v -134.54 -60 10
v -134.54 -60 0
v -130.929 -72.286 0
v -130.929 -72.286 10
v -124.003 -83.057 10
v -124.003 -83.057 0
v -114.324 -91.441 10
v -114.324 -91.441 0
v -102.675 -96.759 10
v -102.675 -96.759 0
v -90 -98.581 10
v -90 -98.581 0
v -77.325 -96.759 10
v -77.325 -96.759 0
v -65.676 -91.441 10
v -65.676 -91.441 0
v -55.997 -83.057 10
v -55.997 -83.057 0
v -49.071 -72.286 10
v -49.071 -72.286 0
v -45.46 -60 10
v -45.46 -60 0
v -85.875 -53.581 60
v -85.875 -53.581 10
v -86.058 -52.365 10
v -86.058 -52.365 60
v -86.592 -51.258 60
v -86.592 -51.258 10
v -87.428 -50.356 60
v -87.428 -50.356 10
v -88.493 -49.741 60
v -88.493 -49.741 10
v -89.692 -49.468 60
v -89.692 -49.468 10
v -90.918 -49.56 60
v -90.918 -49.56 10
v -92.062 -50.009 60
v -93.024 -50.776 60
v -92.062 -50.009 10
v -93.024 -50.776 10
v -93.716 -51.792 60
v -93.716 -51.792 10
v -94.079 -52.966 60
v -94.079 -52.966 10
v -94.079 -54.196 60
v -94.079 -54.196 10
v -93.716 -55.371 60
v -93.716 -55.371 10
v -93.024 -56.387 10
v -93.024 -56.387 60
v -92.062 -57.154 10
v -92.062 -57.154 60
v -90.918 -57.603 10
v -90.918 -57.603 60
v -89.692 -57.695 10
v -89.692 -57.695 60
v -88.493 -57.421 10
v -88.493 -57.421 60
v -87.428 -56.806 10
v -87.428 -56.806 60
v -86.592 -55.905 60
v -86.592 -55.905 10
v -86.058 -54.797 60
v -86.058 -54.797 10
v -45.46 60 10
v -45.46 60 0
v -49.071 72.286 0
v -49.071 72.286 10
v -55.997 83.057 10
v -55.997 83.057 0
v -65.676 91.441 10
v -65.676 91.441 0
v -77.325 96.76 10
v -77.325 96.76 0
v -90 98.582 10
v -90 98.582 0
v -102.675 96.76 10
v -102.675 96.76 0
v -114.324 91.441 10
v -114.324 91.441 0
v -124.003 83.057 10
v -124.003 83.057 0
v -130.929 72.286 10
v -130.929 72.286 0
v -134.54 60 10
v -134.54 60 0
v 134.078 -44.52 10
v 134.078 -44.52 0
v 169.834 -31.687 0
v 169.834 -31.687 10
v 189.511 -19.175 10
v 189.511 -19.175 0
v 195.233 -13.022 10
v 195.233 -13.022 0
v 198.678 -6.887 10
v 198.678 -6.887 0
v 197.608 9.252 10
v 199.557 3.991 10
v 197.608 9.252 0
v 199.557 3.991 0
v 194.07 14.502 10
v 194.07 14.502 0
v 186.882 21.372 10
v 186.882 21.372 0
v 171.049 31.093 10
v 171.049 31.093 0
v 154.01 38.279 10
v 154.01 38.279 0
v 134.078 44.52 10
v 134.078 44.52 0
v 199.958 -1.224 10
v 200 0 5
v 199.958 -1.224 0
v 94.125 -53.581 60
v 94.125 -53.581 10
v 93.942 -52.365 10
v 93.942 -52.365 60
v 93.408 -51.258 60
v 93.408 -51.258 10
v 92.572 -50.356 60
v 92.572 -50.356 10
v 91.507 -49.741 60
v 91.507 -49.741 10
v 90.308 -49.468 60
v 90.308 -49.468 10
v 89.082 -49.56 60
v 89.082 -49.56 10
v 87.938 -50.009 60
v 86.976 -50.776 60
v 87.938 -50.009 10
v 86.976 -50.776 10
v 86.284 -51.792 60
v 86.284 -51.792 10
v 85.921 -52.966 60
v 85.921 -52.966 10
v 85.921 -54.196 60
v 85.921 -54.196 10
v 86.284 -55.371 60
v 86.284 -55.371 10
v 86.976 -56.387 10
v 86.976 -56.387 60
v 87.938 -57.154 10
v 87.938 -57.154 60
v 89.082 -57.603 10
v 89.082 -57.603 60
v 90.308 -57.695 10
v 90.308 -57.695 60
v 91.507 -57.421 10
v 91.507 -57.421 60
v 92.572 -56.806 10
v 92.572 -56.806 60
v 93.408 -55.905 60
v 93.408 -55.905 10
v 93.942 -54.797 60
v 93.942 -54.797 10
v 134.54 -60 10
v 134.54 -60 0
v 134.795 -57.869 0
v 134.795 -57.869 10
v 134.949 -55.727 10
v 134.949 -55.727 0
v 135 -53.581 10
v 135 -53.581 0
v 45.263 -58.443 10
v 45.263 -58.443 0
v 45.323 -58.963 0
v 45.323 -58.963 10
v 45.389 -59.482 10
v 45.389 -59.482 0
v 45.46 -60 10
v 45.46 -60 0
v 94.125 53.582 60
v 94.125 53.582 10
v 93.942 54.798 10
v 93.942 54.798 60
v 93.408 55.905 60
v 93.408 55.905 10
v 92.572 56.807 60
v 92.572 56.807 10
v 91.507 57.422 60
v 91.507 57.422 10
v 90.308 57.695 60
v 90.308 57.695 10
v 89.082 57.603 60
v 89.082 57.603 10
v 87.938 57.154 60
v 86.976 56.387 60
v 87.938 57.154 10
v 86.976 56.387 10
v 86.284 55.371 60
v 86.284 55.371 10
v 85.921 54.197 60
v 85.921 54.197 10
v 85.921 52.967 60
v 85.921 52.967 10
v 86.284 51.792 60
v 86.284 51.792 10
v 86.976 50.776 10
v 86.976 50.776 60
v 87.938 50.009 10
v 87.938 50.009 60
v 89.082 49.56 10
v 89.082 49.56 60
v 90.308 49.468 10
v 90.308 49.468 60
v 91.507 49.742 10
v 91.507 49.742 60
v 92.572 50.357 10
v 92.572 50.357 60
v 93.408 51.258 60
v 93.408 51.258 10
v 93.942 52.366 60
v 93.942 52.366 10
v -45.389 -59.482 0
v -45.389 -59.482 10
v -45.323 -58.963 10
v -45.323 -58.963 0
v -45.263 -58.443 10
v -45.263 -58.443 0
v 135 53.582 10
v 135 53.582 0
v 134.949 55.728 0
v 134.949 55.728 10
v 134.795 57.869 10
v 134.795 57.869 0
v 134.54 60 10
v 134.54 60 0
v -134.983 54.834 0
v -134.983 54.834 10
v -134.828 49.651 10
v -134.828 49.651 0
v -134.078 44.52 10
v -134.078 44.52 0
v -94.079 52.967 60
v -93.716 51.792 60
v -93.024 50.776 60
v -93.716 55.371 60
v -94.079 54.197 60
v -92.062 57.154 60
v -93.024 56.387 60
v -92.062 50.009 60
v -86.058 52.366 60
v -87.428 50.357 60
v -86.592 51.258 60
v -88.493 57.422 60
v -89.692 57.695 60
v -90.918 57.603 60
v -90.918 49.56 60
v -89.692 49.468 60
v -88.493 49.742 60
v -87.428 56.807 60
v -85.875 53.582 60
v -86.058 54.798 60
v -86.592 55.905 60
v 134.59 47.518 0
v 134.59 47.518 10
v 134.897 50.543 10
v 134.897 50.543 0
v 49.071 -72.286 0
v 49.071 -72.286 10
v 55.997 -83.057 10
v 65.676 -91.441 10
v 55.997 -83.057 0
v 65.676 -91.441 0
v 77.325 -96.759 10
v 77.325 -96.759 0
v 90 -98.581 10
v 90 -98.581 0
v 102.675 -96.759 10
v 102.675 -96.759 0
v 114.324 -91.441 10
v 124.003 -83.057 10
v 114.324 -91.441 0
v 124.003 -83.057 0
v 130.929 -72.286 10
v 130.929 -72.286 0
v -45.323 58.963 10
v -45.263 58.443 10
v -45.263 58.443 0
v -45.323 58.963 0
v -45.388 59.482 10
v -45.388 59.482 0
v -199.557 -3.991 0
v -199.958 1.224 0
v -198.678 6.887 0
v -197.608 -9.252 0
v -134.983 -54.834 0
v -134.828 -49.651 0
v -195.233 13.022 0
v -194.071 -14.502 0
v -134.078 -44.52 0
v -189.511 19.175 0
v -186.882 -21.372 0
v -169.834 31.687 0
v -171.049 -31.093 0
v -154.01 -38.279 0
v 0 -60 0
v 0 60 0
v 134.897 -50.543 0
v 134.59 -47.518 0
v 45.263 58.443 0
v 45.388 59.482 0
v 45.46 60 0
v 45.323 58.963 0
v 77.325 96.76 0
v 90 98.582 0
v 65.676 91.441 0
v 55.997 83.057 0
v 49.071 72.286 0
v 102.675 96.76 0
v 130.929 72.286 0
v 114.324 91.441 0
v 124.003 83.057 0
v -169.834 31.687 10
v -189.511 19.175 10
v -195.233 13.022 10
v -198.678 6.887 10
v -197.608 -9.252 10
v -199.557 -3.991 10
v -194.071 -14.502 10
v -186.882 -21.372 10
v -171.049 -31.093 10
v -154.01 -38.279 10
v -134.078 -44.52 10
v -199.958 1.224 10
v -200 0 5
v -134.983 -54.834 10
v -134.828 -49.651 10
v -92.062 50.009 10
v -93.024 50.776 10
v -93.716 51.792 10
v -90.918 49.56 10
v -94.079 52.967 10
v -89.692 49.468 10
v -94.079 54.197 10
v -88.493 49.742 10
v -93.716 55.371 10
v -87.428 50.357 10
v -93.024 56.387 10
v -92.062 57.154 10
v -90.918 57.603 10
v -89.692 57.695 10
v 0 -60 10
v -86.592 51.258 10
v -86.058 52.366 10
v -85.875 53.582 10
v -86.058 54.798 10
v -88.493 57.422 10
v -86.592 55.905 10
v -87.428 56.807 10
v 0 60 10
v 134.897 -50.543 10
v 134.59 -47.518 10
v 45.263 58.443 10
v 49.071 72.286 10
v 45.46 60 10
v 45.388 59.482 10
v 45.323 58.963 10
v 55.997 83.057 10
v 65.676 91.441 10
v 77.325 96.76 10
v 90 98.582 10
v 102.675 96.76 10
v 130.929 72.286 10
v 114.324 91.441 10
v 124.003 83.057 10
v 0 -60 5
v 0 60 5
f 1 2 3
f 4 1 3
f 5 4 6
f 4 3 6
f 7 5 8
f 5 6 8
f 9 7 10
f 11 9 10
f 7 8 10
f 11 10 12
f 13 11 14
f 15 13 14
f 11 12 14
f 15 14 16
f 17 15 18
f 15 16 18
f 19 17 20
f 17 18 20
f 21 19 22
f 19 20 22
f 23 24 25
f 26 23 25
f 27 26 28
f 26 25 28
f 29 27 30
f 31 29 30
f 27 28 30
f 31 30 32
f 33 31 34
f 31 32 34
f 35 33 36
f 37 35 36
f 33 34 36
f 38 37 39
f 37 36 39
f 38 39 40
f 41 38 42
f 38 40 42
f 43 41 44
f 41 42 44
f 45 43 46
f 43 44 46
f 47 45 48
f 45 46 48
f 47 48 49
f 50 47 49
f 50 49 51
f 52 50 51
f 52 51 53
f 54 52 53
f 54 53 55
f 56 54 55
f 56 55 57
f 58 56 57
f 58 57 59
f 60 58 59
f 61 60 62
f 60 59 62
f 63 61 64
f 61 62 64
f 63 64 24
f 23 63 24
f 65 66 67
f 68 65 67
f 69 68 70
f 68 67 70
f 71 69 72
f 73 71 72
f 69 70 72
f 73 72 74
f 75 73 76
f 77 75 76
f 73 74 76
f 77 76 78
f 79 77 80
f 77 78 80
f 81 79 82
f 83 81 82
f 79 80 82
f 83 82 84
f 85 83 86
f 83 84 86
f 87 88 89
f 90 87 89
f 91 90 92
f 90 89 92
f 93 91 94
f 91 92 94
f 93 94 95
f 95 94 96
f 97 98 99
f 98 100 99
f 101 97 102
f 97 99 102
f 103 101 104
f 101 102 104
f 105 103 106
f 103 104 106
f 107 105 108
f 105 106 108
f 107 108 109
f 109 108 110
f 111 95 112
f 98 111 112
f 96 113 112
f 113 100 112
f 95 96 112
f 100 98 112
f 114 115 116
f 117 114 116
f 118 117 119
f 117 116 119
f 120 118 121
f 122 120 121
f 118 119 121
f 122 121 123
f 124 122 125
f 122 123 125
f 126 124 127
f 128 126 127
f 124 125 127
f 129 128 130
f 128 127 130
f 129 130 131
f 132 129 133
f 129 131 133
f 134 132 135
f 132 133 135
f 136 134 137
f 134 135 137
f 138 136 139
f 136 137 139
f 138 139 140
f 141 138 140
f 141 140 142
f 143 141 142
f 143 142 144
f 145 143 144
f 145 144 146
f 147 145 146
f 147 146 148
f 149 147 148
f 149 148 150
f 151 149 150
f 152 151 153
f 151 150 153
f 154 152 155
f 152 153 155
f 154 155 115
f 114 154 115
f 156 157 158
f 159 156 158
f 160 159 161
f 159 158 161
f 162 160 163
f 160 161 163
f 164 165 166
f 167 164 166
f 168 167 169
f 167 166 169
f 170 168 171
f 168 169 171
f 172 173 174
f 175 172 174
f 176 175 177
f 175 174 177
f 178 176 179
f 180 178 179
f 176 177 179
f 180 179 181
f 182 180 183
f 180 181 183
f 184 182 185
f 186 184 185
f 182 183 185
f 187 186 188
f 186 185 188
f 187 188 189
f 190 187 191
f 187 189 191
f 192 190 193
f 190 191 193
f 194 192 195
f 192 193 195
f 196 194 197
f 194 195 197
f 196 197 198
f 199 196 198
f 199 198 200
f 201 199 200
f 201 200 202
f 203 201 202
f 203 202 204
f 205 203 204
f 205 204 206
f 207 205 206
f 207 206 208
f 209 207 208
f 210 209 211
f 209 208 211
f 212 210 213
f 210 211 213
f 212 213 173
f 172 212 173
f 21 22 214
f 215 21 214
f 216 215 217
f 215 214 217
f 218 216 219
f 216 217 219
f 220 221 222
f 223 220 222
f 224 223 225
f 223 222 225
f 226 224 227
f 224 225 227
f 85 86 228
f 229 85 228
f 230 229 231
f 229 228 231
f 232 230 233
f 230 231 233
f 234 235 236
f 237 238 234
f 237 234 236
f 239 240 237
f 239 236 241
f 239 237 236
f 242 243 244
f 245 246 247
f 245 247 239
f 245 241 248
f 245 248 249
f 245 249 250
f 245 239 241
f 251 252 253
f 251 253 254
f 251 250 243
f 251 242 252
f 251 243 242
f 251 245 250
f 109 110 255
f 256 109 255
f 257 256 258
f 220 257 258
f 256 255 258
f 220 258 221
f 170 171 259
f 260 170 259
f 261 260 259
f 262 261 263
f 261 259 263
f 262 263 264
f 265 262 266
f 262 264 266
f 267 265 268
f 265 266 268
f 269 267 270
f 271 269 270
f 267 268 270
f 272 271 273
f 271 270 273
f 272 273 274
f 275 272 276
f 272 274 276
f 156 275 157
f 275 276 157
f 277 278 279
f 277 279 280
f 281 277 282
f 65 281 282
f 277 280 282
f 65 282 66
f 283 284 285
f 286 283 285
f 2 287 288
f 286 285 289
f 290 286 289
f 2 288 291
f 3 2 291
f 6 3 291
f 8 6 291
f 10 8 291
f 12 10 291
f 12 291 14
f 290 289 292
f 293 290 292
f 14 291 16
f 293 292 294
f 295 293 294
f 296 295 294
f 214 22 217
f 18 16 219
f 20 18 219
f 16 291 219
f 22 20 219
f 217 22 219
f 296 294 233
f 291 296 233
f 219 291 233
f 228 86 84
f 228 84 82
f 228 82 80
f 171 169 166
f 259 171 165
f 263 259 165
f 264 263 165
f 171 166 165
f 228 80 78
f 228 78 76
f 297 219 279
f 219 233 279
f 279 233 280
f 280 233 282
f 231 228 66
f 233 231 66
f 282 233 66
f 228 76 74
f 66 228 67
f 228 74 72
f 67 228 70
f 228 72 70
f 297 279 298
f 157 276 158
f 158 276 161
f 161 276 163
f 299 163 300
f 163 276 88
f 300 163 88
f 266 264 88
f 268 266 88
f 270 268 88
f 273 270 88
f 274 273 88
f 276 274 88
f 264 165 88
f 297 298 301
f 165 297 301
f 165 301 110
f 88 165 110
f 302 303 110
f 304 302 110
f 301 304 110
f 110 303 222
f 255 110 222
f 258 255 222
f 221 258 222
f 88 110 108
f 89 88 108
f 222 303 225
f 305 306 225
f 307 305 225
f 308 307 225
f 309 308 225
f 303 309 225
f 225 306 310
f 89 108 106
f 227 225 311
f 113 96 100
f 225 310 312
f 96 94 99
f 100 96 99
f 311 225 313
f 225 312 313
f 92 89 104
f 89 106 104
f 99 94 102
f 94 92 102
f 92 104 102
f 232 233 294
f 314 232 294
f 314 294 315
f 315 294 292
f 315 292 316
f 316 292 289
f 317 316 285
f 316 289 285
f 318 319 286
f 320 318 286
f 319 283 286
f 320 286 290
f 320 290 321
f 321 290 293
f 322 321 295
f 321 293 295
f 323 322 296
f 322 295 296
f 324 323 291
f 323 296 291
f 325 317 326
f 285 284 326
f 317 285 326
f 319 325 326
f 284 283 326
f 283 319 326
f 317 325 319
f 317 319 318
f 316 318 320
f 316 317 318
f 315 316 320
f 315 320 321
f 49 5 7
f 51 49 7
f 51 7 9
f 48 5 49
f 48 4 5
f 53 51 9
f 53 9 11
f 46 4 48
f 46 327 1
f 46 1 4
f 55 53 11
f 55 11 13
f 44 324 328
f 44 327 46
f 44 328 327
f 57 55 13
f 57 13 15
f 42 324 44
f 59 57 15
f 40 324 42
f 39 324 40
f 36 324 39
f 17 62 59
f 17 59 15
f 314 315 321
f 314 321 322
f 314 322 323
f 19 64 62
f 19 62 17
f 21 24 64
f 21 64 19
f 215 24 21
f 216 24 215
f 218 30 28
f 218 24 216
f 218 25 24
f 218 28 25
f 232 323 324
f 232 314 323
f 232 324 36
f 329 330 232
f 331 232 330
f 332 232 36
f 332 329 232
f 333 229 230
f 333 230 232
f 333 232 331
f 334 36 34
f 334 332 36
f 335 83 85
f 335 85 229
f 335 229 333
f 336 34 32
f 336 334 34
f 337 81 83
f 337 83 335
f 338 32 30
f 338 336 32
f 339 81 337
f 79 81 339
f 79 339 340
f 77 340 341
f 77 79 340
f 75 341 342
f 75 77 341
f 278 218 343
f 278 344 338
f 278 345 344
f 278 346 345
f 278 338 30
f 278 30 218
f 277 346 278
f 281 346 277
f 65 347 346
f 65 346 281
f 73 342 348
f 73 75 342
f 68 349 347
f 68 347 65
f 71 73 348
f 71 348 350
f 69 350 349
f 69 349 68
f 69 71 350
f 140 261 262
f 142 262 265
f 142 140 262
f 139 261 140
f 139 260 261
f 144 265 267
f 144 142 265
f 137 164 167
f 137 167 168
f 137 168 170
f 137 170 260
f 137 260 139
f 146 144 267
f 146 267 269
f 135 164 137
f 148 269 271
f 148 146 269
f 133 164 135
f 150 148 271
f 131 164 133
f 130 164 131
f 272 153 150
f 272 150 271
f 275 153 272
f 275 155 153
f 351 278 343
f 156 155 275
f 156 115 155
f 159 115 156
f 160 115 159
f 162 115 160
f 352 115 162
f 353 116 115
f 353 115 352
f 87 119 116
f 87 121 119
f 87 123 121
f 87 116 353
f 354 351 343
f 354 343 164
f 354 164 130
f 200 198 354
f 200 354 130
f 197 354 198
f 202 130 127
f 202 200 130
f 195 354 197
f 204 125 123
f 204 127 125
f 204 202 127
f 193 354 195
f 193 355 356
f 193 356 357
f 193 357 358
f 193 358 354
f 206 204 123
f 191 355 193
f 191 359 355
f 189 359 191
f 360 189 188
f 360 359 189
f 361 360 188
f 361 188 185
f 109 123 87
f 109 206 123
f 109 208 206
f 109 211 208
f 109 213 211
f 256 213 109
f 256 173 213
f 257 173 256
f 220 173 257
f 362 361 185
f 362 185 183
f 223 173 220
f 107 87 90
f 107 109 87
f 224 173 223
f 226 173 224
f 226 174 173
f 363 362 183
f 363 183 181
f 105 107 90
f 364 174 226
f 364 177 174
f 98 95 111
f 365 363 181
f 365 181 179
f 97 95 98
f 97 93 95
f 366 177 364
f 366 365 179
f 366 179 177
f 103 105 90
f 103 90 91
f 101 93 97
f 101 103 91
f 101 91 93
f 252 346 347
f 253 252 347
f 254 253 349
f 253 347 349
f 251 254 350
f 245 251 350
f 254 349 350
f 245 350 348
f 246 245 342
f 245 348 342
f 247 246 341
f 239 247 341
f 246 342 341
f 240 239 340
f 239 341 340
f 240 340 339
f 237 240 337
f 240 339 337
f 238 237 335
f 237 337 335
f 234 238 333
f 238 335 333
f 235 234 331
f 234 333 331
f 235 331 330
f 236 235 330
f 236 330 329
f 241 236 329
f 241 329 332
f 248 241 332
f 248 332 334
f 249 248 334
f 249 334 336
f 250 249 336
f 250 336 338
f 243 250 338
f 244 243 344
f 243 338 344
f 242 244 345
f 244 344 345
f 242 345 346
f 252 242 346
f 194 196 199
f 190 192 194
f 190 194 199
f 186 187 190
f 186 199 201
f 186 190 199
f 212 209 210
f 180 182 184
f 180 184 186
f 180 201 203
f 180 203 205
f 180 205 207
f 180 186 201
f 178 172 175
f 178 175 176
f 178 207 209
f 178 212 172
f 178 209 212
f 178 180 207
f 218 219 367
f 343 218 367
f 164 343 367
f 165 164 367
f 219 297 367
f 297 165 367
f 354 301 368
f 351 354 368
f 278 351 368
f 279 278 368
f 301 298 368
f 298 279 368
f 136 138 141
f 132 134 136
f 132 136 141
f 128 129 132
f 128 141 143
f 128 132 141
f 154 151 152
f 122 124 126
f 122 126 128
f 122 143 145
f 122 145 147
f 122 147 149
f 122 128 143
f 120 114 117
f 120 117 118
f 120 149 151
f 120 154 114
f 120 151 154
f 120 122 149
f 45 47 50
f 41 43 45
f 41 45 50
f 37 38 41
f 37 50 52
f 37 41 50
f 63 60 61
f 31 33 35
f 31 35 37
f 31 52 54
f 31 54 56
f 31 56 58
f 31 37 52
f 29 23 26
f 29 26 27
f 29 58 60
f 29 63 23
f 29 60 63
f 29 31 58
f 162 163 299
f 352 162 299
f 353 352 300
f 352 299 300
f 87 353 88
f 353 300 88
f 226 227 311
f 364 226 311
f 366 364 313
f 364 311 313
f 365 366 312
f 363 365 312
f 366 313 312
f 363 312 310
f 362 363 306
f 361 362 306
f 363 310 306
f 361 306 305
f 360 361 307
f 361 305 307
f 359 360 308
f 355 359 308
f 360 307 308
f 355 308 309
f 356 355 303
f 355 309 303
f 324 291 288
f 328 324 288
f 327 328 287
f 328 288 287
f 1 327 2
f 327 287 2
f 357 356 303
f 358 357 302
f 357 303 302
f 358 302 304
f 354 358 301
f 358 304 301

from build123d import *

# Parameters (mm, degrees)
F1_DEPTH = 10
F2_R     = 4.125
F3_DEPTH = 50


with BuildPart() as f1:
    # F0 (on Top) → F1 (new body)
    with BuildSketch(Plane.XY):
        with BuildLine():
            add(Edge.make_bspline(
                [(-134.0782683535, 44.5204628904), (-199.999999721, 26.6527141895), (-200, 1.885e-07)],
                knots=[2.305532398, 2.305532398, 2.305532398, 3.1415926504, 3.1415926504, 3.1415926504], degree=2, weights=[1, 0.9138904048, 1]))
            add(Edge.make_bspline(
                [(-200, 1.885e-07), (-200.000000279, -26.6526940275), (-134.0783510273, -44.5204404821)],
                knots=[3.1415926504, 3.1415926504, 3.1415926504, 3.9776523521, 3.9776523521, 3.9776523521], degree=2, weights=[1, 0.9138905166, 1]))
            ThreePointArc((-134.0783510273, -44.5204404821), (-118.4364363932, -18.7048054461), (-90, -8.5812887157))
            Line((-90, -8.5812887157), (-90, 8.5817132985))
            ThreePointArc((-90, 8.5817132985), (-118.4362772848, 18.7051003009), (-134.0782683535, 44.5204628904))
        make_face()
        with BuildLine():
            add(Edge.make_bspline(
                [(134.0783510273, -44.5204404821), (200, -26.6526941032), (200, 0)],
                knots=[5.4471256087, 5.4471256087, 5.4471256087, 6.2831853072, 6.2831853072, 6.2831853072], degree=2, weights=[1, 0.9138905173, 1]))
            add(Edge.make_bspline(
                [(200, 0), (200, 26.6527141139), (134.0782683535, 44.5204628904)],
                knots=[0, 0, 0, 0.8360602556, 0.8360602556, 0.8360602556], degree=2, weights=[1, 0.9138904042, 1]))
            ThreePointArc((134.0782683535, 44.5204628904), (118.4362772848, 18.7051003009), (90, 8.5817132985))
            Line((90, 8.5817132985), (90, -8.5812887157))
            ThreePointArc((90, -8.5812887157), (118.4364363932, -18.7048054461), (134.0783510273, -44.5204404821))
        make_face()
        with BuildLine():
            Line((90, -8.5812887157), (90, 8.5817132985))
            ThreePointArc((90, 8.5817132985), (58.1801948466, 21.7619081451), (45, 53.5817132985))
            Line((45, 53.5817132985), (-45, 53.5817132985))
            ThreePointArc((-45, 53.5817132985), (-58.1801948466, 21.7619081451), (-90, 8.5817132985))
            Line((-90, 8.5817132985), (-90, -8.5812887157))
            ThreePointArc((-90, -8.5812887157), (-58.1801948466, -21.7614835623), (-45, -53.5812887157))
            ThreePointArc((-45, -53.5812887157), (-45.0000000005, -53.5815010071), (-45.000000002, -53.5817132985))
            Line((-45.000000002, -53.5817132985), (45.000000002, -53.5817132985))
            ThreePointArc((45.000000002, -53.5817132985), (58.1800447343, -21.7616336753), (90, -8.5812887157))
        make_face()
        with BuildLine():
            Line((90, 8.5817132985), (90, 53.5817132985))
            Line((90, 53.5817132985), (45, 53.5817132985))
            ThreePointArc((45, 53.5817132985), (58.1801948466, 21.7619081451), (90, 8.5817132985))
        make_face()
        with BuildLine():
            Line((45.000000002, -53.5817132985), (90, -53.5817132985))
            Line((90, -53.5817132985), (90, -8.5812887157))
            ThreePointArc((90, -8.5812887157), (58.1800447343, -21.7616336753), (45.000000002, -53.5817132985))
        make_face()
        with BuildLine():
            Line((-90, -8.5812887157), (-90, -53.5817132985))
            Line((-90, -53.5817132985), (-45.000000002, -53.5817132985))
            ThreePointArc((-45.000000002, -53.5817132985), (-45.0000000005, -53.5815010071), (-45, -53.5812887157))
            ThreePointArc((-45, -53.5812887157), (-58.1801948466, -21.7614835623), (-90, -8.5812887157))
        make_face()
        with BuildLine():
            Line((-45, 53.5817132985), (-90, 53.5817132985))
            Line((-90, 53.5817132985), (-90, 8.5817132985))
            ThreePointArc((-90, 8.5817132985), (-58.1801948466, 21.7619081451), (-45, 53.5817132985))
        make_face()
        with BuildLine():
            add(Edge.make_bspline(
                [(-90, 53.5817132985), (-114.0747884437, 49.9423039853), (-134.0782683535, 44.5204628904)],
                knots=[2.0375616658, 2.0375616658, 2.0375616658, 2.305532398, 2.305532398, 2.305532398], degree=2, weights=[1, 0.991037381, 1]))
            ThreePointArc((-134.0782683535, 44.5204628904), (-118.4362772848, 18.7051003009), (-90, 8.5817132985))
            Line((-90, 8.5817132985), (-90, 53.5817132985))
        make_face()
        with BuildLine():
            ThreePointArc((-90, -8.5812887157), (-118.4364363932, -18.7048054461), (-134.0783510273, -44.5204404821))
            add(Edge.make_bspline(
                [(-134.0783510273, -44.5204404821), (-114.0748390978, -49.9422963279), (-90, -53.5817132985)],
                knots=[3.9776523521, 3.9776523521, 3.9776523521, 4.2456236413, 4.2456236413, 4.2456236413], degree=2, weights=[1, 0.9910373438, 1]))
            Line((-90, -53.5817132985), (-90, -8.5812887157))
        make_face()
        with BuildLine():
            ThreePointArc((90, 8.5817132985), (118.4362772848, 18.7051003009), (134.0782683535, 44.5204628904))
            add(Edge.make_bspline(
                [(134.0782683535, 44.5204628904), (114.0747884437, 49.9423039853), (90, 53.5817132985)],
                knots=[0.8360602556, 0.8360602556, 0.8360602556, 1.1040309877, 1.1040309877, 1.1040309877], degree=2, weights=[1, 0.991037381, 1]))
            Line((90, 53.5817132985), (90, 8.5817132985))
        make_face()
        with BuildLine():
            add(Edge.make_bspline(
                [(90, -53.5817132985), (114.0748390978, -49.9422963279), (134.0783510273, -44.5204404821)],
                knots=[5.1791543194, 5.1791543194, 5.1791543194, 5.4471256087, 5.4471256087, 5.4471256087], degree=2, weights=[1, 0.9910373438, 1]))
            ThreePointArc((134.0783510273, -44.5204404821), (118.4364363932, -18.7048054461), (90, -8.5812887157))
            Line((90, -8.5812887157), (90, -53.5817132985))
        make_face()
        with BuildLine():
            add(Edge.make_bspline(
                [(45.2634197039, -58.4432207814), (68.6024188359, -56.816406569), (90, -53.5817132985)],
                knots=[4.9406839873, 4.9406839873, 4.9406839873, 5.1791543194, 5.1791543194, 5.1791543194], degree=2, weights=[1, 0.9928999054, 1]))
            Line((90, -53.5817132985), (45.000000002, -53.5817132985))
            ThreePointArc((45.000000002, -53.5817132985), (45.0659146697, -56.0160321373), (45.2634197039, -58.4432207814))
        make_face()
        with BuildLine():
            ThreePointArc((135, -53.5812887157), (134.7689948303, -49.0274878982), (134.0783510273, -44.5204404821))
            add(Edge.make_bspline(
                [(90, -53.5817132985), (114.0748390978, -49.9422963279), (134.0783510273, -44.5204404821)],
                knots=[5.1791543194, 5.1791543194, 5.1791543194, 5.4471256087, 5.4471256087, 5.4471256087], degree=2, weights=[1, 0.9910373438, 1]))
            add(Edge.make_bspline(
                [(45.2634197039, -58.4432207814), (68.6024188359, -56.816406569), (90, -53.5817132985)],
                knots=[4.9406839873, 4.9406839873, 4.9406839873, 5.1791543194, 5.1791543194, 5.1791543194], degree=2, weights=[1, 0.9928999054, 1]))
            ThreePointArc((45.2634197039, -58.4432207814), (45.3549879851, -59.2224678649), (45.4601285874, -60))
            Line((45.4601285874, -60), (134.5398714126, -60))
            ThreePointArc((134.5398714126, -60), (134.8848204495, -56.7988799292), (135, -53.5812887157))
        make_face()
        with BuildLine():
            Line((45, 53.5817132985), (90, 53.5817132985))
            add(Edge.make_bspline(
                [(90, 53.5817132985), (68.6023975421, 56.816409788), (45.2633739095, 58.4432239734)],
                knots=[1.1040309877, 1.1040309877, 1.1040309877, 1.3425015549, 1.3425015549, 1.3425015549], degree=2, weights=[1, 0.9928998914, 1]))
            ThreePointArc((45.2633739095, 58.4432239734), (45.0658917187, 56.0160331141), (45, 53.5817132985))
        make_face()
        with BuildLine():
            add(Edge.make_bspline(
                [(45.2633739095, 58.4432239734), (22.9291498784, 60), (0, 60)],
                knots=[1.3425015549, 1.3425015549, 1.3425015549, 1.5707963268, 1.5707963268, 1.5707963268], degree=2, weights=[1, 0.9934922579, 1]))
            add(Edge.make_bspline(
                [(0, 60), (-22.9291498784, 60), (-45.2633739095, 58.4432239734)],
                knots=[1.5707963268, 1.5707963268, 1.5707963268, 1.7990910987, 1.7990910987, 1.7990910987], degree=2, weights=[1, 0.9934922579, 1]))
            ThreePointArc((-45.2633739095, 58.4432239734), (-45.0658917187, 56.0160331141), (-45, 53.5817132985))
            Line((-45, 53.5817132985), (45, 53.5817132985))
            ThreePointArc((45, 53.5817132985), (45.0658917187, 56.0160331141), (45.2633739095, 58.4432239734))
        make_face()
        with BuildLine():
            Line((45.4600674022, 60), (134.5399325978, 60))
            ThreePointArc((134.5399325978, 60), (90, 98.5817132985), (45.4600674022, 60))
        make_face()
        with BuildLine():
            ThreePointArc((135, 53.5817132985), (134.884835785, 56.7990905765), (134.5399325978, 60))
            Line((134.5399325978, 60), (45.4600674022, 60))
            ThreePointArc((45.4600674022, 60), (45.3549345313, 59.2224693911), (45.2633739095, 58.4432239734))
            add(Edge.make_bspline(
                [(90, 53.5817132985), (68.6023975421, 56.816409788), (45.2633739095, 58.4432239734)],
                knots=[1.1040309877, 1.1040309877, 1.1040309877, 1.3425015549, 1.3425015549, 1.3425015549], degree=2, weights=[1, 0.9928998914, 1]))
            add(Edge.make_bspline(
                [(134.0782683535, 44.5204628904), (114.0747884437, 49.9423039853), (90, 53.5817132985)],
                knots=[0.8360602556, 0.8360602556, 0.8360602556, 1.1040309877, 1.1040309877, 1.1040309877], degree=2, weights=[1, 0.991037381, 1]))
            ThreePointArc((134.0782683535, 44.5204628904), (134.7689740552, 49.0277082429), (135, 53.5817132985))
        make_face()
        with BuildLine():
            ThreePointArc((-45.4600674022, 60), (-90, 98.5817132985), (-134.5399325978, 60))
            Line((-134.5399325978, 60), (-45.4600674022, 60))
        make_face()
        with BuildLine():
            Line((-45.4600674022, 60), (-134.5399325978, 60))
            ThreePointArc((-134.5399325978, 60), (-134.9800000249, 52.2402224274), (-134.0782683535, 44.5204628904))
            add(Edge.make_bspline(
                [(-90, 53.5817132985), (-114.0747884437, 49.9423039853), (-134.0782683535, 44.5204628904)],
                knots=[2.0375616658, 2.0375616658, 2.0375616658, 2.305532398, 2.305532398, 2.305532398], degree=2, weights=[1, 0.991037381, 1]))
            add(Edge.make_bspline(
                [(-45.2633739095, 58.4432239734), (-68.6023975421, 56.816409788), (-90, 53.5817132985)],
                knots=[1.7990910987, 1.7990910987, 1.7990910987, 2.0375616658, 2.0375616658, 2.0375616658], degree=2, weights=[1, 0.9928998914, 1]))
            ThreePointArc((-45.2633739095, 58.4432239734), (-45.3549345313, 59.2224693911), (-45.4600674022, 60))
        make_face()
        with BuildLine():
            add(Edge.make_bspline(
                [(-45.2633739095, 58.4432239734), (-68.6023975421, 56.816409788), (-90, 53.5817132985)],
                knots=[1.7990910987, 1.7990910987, 1.7990910987, 2.0375616658, 2.0375616658, 2.0375616658], degree=2, weights=[1, 0.9928998914, 1]))
            Line((-90, 53.5817132985), (-45, 53.5817132985))
            ThreePointArc((-45, 53.5817132985), (-45.0658917187, 56.0160331141), (-45.2633739095, 58.4432239734))
        make_face()
        with BuildLine():
            Line((-45.000000002, -53.5817132985), (-90, -53.5817132985))
            add(Edge.make_bspline(
                [(-90, -53.5817132985), (-68.6024188359, -56.816406569), (-45.2634197039, -58.4432207814)],
                knots=[4.2456236413, 4.2456236413, 4.2456236413, 4.4840939735, 4.4840939735, 4.4840939735], degree=2, weights=[1, 0.9928999054, 1]))
            ThreePointArc((-45.2634197039, -58.4432207814), (-45.0659146697, -56.0160321373), (-45.000000002, -53.5817132985))
        make_face()
        with BuildLine():
            Line((-45.4601285874, -60), (-134.5398714126, -60))
            ThreePointArc((-134.5398714126, -60), (-90, -98.5812887157), (-45.4601285874, -60))
        make_face()
        with BuildLine():
            ThreePointArc((45.4601285874, -60), (90, -98.5812887157), (134.5398714126, -60))
            Line((134.5398714126, -60), (45.4601285874, -60))
        make_face()
        with BuildLine():
            add(Edge.make_bspline(
                [(-134.0783510273, -44.5204404821), (-114.0748390978, -49.9422963279), (-90, -53.5817132985)],
                knots=[3.9776523521, 3.9776523521, 3.9776523521, 4.2456236413, 4.2456236413, 4.2456236413], degree=2, weights=[1, 0.9910373438, 1]))
            ThreePointArc((-134.0783510273, -44.5204404821), (-134.9800125369, -52.2402174345), (-134.5398714126, -60))
            Line((-134.5398714126, -60), (-45.4601285874, -60))
            ThreePointArc((-45.4601285874, -60), (-45.3549879851, -59.2224678649), (-45.2634197039, -58.4432207814))
            add(Edge.make_bspline(
                [(-90, -53.5817132985), (-68.6024188359, -56.816406569), (-45.2634197039, -58.4432207814)],
                knots=[4.2456236413, 4.2456236413, 4.2456236413, 4.4840939735, 4.4840939735, 4.4840939735], degree=2, weights=[1, 0.9928999054, 1]))
        make_face()
        with BuildLine():
            add(Edge.make_bspline(
                [(-2.225e-07, -60), (22.9291735847, -60.0000000077), (45.2634197039, -58.4432207814)],
                knots=[4.7123889793, 4.7123889793, 4.7123889793, 4.9406839873, 4.9406839873, 4.9406839873], degree=2, weights=[1, 0.9934922444, 1]))
            ThreePointArc((45.2634197039, -58.4432207814), (45.0659146697, -56.0160321373), (45.000000002, -53.5817132985))
            Line((45.000000002, -53.5817132985), (-45.000000002, -53.5817132985))
            ThreePointArc((-45.000000002, -53.5817132985), (-45.0659146697, -56.0160321373), (-45.2634197039, -58.4432207814))
            add(Edge.make_bspline(
                [(-45.2634197039, -58.4432207814), (-22.9291738043, -59.9999999923), (-2.225e-07, -60)],
                knots=[4.4840939735, 4.4840939735, 4.4840939735, 4.7123889793, 4.7123889793, 4.7123889793], degree=2, weights=[1, 0.9934922445, 1]))
        make_face()
    extrude(amount=F1_DEPTH)

    # F2 (on face) → F3 (join)
    with BuildSketch(Plane.XY.offset(10)):
        with Locations((90, 53.5817132985)):
            Circle(F2_R)
        with Locations((90, -53.5812887157)):
            Circle(F2_R)
        with Locations((-90, -53.5812887157)):
            Circle(F2_R)
        with Locations((-90, 53.5817132985)):
            Circle(F2_R)
    extrude(amount=F3_DEPTH)


solid = f1.part
